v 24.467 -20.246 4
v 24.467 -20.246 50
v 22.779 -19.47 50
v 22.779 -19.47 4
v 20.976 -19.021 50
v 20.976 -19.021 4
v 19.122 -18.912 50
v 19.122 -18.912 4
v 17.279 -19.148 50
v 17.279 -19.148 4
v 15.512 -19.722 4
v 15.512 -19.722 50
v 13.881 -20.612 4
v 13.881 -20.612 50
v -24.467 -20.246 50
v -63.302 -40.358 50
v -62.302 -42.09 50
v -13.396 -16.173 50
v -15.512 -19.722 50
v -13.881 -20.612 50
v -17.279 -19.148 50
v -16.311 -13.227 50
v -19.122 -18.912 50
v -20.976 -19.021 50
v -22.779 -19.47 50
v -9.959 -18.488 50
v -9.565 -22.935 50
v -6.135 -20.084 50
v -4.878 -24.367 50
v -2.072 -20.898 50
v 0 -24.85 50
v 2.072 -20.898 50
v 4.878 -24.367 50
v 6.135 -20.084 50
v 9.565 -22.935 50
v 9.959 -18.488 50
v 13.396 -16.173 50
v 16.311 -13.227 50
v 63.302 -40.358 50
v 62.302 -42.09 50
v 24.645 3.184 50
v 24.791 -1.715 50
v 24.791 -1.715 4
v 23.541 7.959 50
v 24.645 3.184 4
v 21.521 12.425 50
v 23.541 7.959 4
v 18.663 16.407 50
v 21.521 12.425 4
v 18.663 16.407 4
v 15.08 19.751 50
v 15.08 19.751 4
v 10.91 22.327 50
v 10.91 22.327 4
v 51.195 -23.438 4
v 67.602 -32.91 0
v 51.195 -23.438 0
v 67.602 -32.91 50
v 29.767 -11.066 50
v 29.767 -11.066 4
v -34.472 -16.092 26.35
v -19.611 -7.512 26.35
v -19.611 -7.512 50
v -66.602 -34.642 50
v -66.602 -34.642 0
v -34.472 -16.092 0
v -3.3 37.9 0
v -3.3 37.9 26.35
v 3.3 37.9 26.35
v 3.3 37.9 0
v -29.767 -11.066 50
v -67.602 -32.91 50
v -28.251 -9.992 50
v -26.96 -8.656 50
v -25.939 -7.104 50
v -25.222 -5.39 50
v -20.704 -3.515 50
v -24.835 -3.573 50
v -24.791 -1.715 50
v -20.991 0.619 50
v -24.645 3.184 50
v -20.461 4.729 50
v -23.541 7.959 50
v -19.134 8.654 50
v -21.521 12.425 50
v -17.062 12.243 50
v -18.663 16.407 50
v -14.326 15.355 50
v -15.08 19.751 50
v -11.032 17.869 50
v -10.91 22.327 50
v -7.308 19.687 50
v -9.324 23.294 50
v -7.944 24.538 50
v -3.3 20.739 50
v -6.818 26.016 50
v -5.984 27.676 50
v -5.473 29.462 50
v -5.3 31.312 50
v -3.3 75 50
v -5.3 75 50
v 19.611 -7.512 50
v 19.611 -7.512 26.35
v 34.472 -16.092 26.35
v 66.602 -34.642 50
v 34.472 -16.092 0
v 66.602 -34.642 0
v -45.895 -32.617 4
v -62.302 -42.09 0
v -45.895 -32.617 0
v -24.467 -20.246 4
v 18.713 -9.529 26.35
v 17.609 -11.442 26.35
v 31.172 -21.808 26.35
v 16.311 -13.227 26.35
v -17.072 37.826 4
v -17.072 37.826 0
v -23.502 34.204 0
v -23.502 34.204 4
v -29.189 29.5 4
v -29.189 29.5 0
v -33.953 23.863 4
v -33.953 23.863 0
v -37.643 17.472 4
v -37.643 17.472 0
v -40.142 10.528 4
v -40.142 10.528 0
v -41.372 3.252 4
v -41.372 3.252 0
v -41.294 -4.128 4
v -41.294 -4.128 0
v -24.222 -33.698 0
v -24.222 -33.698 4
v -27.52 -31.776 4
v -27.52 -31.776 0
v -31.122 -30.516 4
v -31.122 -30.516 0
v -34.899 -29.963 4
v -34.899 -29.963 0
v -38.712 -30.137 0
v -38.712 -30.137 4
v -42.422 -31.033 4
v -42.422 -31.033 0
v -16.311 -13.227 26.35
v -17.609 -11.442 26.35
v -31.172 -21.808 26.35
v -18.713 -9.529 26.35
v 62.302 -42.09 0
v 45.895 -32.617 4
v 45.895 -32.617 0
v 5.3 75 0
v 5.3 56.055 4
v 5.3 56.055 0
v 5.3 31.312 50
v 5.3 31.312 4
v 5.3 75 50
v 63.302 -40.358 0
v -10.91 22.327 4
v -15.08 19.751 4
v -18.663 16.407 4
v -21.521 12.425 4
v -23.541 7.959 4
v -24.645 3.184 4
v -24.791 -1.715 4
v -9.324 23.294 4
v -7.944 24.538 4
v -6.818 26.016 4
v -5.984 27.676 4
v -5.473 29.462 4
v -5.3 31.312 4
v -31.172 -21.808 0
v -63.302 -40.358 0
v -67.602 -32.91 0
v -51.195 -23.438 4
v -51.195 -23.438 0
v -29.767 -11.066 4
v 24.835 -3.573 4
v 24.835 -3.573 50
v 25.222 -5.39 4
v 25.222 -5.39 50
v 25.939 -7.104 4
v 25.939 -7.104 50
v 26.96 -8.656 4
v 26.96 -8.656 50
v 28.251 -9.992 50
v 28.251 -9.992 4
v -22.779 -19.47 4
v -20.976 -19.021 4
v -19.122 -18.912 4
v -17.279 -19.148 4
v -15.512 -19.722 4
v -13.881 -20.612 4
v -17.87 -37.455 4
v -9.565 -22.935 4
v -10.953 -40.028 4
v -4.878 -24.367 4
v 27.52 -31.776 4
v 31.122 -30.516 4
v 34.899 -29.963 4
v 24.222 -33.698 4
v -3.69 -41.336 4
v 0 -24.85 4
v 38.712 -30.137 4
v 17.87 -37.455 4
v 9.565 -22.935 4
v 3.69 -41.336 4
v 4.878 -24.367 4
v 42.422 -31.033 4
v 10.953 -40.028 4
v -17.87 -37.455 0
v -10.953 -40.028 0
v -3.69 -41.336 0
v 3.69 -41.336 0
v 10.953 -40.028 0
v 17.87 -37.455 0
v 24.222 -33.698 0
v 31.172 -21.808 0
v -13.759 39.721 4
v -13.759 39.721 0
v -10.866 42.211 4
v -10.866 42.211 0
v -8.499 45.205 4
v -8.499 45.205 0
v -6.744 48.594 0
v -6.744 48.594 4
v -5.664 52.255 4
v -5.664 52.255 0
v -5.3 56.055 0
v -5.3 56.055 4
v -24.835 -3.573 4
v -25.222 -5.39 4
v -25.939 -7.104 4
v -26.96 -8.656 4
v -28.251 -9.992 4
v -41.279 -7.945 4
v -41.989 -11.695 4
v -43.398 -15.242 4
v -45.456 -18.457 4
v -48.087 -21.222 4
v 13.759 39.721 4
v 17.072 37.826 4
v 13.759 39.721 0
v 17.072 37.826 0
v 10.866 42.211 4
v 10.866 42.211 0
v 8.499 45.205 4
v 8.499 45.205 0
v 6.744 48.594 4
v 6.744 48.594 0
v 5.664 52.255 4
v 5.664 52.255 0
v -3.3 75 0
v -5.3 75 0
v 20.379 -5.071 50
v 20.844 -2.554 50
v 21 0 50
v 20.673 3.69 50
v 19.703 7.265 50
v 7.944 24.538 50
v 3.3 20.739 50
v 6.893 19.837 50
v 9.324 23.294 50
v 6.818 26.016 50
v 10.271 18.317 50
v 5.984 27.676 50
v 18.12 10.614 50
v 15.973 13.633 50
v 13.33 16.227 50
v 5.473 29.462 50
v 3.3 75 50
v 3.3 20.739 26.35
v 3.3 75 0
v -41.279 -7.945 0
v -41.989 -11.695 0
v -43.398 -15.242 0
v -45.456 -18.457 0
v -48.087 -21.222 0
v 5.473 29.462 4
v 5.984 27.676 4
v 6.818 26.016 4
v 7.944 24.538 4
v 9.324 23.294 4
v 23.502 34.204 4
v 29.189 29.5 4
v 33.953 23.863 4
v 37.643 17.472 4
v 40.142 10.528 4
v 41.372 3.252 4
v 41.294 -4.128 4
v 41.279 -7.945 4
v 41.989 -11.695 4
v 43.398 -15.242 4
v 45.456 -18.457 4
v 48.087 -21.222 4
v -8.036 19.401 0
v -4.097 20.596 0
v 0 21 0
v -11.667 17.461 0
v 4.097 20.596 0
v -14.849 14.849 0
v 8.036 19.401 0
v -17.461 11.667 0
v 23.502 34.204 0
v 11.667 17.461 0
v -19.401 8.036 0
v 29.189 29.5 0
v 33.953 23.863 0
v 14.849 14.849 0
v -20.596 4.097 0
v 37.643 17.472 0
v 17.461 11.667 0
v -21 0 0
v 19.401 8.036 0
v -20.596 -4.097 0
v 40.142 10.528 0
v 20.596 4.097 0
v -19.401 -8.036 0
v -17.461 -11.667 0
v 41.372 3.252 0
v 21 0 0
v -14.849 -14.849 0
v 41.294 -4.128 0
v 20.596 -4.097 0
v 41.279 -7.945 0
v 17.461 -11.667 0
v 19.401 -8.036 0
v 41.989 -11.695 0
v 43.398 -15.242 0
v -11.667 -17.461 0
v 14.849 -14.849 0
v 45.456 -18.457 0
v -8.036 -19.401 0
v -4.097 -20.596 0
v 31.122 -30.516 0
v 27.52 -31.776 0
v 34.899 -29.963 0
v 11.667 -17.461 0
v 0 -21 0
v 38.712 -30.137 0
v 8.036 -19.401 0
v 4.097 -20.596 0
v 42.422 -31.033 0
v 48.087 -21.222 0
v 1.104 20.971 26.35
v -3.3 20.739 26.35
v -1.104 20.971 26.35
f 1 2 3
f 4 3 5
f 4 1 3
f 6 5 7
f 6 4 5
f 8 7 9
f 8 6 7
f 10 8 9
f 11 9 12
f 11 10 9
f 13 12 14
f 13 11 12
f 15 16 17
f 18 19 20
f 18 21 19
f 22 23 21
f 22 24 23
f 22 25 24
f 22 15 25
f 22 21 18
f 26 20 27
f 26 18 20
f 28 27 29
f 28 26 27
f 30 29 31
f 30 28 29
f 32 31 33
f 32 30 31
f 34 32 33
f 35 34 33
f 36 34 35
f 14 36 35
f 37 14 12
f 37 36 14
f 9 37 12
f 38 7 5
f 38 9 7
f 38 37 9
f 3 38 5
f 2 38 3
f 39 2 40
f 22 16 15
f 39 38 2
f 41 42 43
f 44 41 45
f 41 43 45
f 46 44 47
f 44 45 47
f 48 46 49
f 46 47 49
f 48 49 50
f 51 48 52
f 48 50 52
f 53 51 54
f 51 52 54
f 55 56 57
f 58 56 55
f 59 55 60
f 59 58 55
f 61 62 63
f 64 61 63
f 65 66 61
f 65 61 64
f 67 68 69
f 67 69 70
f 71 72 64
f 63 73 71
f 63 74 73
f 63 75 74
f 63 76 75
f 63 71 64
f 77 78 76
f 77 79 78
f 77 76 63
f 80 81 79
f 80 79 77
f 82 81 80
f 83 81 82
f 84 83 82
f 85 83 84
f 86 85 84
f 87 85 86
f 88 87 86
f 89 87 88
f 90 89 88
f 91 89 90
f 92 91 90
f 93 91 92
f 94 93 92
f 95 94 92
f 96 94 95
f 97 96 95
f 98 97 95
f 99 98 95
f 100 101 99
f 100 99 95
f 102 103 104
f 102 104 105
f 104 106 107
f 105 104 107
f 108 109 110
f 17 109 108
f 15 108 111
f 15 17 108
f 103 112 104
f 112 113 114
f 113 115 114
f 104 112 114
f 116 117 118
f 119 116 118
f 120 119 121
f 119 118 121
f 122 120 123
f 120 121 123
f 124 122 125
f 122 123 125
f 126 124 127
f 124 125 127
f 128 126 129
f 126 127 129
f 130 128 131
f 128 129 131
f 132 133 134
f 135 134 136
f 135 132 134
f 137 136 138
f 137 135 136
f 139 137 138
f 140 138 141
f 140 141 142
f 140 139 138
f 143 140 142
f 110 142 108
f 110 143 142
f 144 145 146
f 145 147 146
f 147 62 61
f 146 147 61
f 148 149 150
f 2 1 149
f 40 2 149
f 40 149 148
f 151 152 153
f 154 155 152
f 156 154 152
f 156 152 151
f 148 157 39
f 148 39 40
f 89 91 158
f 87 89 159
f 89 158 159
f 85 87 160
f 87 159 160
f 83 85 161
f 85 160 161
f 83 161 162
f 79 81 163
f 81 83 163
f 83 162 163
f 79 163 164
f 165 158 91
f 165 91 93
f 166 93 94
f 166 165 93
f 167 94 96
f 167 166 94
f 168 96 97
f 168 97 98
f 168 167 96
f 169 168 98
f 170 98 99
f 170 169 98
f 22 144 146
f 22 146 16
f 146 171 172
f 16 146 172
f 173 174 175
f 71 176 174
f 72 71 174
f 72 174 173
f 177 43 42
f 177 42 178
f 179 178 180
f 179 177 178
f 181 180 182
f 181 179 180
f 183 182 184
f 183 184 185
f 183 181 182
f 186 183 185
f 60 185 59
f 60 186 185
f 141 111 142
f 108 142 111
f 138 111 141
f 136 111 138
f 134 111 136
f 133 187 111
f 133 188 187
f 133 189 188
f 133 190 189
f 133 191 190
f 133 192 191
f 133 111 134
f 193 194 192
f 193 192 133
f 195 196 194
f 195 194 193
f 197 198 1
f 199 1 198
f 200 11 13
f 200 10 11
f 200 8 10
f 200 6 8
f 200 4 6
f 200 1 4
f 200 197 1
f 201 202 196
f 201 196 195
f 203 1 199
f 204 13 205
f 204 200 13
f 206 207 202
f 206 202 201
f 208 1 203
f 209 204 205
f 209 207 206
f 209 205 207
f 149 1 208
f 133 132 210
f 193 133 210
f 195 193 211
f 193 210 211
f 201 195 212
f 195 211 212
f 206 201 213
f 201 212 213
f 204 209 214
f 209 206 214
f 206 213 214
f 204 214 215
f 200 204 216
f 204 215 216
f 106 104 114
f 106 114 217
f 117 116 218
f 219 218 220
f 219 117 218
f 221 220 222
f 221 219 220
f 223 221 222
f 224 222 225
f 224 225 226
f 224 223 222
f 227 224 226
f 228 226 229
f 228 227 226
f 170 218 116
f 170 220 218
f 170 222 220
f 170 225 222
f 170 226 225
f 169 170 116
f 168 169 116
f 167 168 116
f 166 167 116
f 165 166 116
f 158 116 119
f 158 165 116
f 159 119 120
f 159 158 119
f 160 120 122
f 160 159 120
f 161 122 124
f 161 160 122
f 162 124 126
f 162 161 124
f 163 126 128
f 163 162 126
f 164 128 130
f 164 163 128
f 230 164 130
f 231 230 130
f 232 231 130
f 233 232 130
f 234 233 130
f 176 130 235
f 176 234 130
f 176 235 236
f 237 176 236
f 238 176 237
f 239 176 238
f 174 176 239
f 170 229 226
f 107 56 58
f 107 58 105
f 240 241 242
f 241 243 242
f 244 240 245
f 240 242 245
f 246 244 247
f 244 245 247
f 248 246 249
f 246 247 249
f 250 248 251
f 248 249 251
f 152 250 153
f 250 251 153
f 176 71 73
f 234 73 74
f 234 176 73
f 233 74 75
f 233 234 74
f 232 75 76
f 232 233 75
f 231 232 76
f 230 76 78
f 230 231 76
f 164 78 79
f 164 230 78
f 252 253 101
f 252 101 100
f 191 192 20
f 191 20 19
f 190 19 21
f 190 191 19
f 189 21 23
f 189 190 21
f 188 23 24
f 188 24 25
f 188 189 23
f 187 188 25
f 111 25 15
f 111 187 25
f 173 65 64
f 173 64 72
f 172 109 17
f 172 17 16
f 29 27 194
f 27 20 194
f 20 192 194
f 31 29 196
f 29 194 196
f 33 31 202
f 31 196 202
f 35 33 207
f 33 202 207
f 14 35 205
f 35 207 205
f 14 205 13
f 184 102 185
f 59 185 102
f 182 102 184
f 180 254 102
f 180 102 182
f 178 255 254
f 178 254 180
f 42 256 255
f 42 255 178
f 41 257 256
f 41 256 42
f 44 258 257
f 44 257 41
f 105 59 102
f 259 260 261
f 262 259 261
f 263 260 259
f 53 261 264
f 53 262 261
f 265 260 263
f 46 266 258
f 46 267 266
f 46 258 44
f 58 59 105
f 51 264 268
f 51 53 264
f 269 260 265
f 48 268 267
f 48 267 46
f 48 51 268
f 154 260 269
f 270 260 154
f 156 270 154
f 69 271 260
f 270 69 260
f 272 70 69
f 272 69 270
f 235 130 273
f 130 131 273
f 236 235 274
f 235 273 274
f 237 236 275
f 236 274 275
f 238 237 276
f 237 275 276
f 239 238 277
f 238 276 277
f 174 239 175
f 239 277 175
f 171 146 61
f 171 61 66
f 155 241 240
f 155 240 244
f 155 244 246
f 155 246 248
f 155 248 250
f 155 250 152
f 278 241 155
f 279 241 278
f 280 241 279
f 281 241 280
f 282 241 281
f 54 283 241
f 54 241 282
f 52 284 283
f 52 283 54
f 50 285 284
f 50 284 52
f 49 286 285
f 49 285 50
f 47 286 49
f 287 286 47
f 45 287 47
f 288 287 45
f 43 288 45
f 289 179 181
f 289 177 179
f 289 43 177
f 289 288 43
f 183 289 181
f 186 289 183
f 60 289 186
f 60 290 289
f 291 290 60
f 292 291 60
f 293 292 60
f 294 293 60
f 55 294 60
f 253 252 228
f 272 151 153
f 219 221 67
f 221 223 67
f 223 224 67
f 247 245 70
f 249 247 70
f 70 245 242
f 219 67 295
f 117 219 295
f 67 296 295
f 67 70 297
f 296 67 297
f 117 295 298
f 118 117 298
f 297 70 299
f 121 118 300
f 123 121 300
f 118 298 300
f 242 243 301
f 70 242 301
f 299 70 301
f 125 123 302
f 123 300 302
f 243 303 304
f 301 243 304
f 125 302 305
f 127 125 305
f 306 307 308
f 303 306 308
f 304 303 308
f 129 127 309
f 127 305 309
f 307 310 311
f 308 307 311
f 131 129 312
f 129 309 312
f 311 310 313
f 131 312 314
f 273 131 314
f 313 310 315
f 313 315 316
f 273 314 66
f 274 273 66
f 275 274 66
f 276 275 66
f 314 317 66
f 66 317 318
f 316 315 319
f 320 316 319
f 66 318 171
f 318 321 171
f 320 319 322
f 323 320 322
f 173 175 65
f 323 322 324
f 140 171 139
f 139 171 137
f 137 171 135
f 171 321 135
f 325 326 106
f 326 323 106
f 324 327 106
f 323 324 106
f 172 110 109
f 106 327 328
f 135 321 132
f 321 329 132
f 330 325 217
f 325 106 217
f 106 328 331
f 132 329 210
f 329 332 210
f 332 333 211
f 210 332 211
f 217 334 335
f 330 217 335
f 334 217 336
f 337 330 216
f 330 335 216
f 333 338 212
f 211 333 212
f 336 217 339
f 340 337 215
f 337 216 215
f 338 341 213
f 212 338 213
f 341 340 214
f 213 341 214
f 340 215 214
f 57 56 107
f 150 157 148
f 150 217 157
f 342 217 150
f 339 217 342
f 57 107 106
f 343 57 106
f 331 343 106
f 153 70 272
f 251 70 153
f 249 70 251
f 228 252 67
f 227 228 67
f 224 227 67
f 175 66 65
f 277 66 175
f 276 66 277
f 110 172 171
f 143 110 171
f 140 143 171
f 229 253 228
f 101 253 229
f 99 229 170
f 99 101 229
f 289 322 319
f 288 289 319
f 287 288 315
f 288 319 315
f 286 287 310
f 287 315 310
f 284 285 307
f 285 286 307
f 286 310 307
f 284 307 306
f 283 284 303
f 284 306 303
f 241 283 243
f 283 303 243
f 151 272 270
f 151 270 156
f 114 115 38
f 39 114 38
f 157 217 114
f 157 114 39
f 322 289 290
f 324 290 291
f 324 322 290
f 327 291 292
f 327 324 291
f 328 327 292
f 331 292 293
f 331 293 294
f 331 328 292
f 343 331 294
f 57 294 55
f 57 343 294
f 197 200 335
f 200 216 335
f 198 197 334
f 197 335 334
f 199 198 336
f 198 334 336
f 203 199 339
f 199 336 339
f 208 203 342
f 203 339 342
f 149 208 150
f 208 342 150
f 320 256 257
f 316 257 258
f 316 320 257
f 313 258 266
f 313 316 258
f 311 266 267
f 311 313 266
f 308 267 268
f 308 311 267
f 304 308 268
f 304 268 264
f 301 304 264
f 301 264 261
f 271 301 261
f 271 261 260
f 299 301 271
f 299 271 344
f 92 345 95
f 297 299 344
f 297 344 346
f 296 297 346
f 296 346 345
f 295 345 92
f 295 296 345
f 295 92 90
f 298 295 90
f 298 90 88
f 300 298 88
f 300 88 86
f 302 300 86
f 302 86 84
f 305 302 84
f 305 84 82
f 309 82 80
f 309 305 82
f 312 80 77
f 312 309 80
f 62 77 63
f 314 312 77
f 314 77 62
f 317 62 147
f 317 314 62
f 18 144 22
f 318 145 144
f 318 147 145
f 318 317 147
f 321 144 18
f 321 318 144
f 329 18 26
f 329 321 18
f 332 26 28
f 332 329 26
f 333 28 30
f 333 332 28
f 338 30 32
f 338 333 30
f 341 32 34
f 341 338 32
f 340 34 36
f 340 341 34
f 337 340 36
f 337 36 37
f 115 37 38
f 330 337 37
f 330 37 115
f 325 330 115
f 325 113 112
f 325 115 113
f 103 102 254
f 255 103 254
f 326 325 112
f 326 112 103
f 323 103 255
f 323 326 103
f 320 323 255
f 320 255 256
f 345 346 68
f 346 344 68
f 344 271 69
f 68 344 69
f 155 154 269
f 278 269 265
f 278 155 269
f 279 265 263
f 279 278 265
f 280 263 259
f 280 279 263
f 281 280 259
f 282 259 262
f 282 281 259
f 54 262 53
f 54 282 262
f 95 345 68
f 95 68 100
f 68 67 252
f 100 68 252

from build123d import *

# Parameters (mm, degrees)
SKETCH1_R                       = 20.75
BOSS_EXTRUDE1_DEPTH             = 50
BOSS_EXTRUDE2_DEPTH             = 3.2
THICKEN1_OUTLINE_R              = 24.85
THICKEN1_OUTLINE_R_2            = 20.85
THICKEN1_DEPTH                  = 50
THICKEN2_OUTLINE_W              = 2
THICKEN2_OUTLINE_H              = 37
THICKEN2_DEPTH                  = 50
THICKEN2_START                  = 26.35
THICKEN2_2_DEPTH                = 23.65
THICKEN3_OUTLINE_W              = 2
THICKEN3_OUTLINE_H              = 37
THICKEN3_DEPTH                  = 50
THICKEN3_START                  = 26.35
THICKEN3_2_DEPTH                = 23.65
BOSS_EXTRUDE4_REACH             = 95.501
SKETCH4_W                       = 26.35
SKETCH4_H                       = 17.15
BOSS_EXTRUDE4_DIRECTION_2_REACH = 95.501
FILLET1_R                       = 10
SKETCH3_R                       = 41.5
BOSS_EXTRUDE3_DEPTH             = 4
FILLET2_R                       = 20
CIRPATTERN4_COUNT               = 3
MOVE_FACE3_BY                   = 0.25
MOVE_FACE4_BY                   = 0.1
MOVE_FACE4_2_BY                 = 0.1
MOVE_FACE4_3_BY                 = 0.1
MOVE_START                      = 26.35
MOVE_FACE5_OUTLINE_W            = 6.6
MOVE_FACE5_OUTLINE_H            = 20.75
MOVE_FACE5_DEPTH                = 23.65
CIRPATTERN1_COUNT               = 3


with BuildPart() as part:
    # Sketch1 → Boss-Extrude1 (new body)
    with BuildSketch(Plane.XY):
        Circle(SKETCH1_R)
    extrude(amount=BOSS_EXTRUDE1_DEPTH)

    # Move Face3: a curved face moved outward by 0.25
    add(Solid.thicken(part.faces().sort_by_distance((-20.75, 0, 25))[0], MOVE_FACE3_BY))


with BuildPart() as body_2:
    # Sketch2 → Boss-Extrude2 (new, symmetric)
    with BuildSketch(Plane(origin=(0, 0, 0), x_dir=(0, 0, -1), z_dir=(1, 0, 0))):
        Polygon((-26.35, 20.75), (-26.35, 38), (0, 38), (0, 75), (-50, 75), (-50, 20.75), align=None)
    extrude(amount=BOSS_EXTRUDE2_DEPTH, both=True)

    # Move Face4: a face moved outward by 0.1
    extrude(body_2.faces().sort_by_distance((0, 38, 13.175))[0], amount=MOVE_FACE4_BY, dir=(0, -1, 0))

    # Move Face4 2: a face moved outward by 0.1
    extrude(body_2.faces().sort_by_distance((-3.2, 51.599129054, 27.380423031))[0], amount=MOVE_FACE4_2_BY, dir=(-1, 0, 0))

    # Move Face4 3: a face moved outward by 0.1
    extrude(body_2.faces().sort_by_distance((3.2, 51.599129054, 27.380423031))[0], amount=MOVE_FACE4_3_BY, dir=(1, 0, 0))

    # Move Face5: read off the stored shape, not the designer's step
    # Move Face5 outline → Move Face5 (add)
    with BuildSketch(Plane.XY.offset(MOVE_START)):
        with Locations((0, 10.375)):
            Rectangle(MOVE_FACE5_OUTLINE_W, MOVE_FACE5_OUTLINE_H)
    extrude(amount=MOVE_FACE5_DEPTH)


with BuildPart() as body_3:
    # Thicken1: read off the stored shape, not the designer's step
    # Thicken1 outline → Thicken1 (new body)
    with BuildSketch(Plane.XY):
        Circle(THICKEN1_OUTLINE_R)
        Circle(THICKEN1_OUTLINE_R_2, mode=Mode.SUBTRACT)
    extrude(amount=THICKEN1_DEPTH)

    # Thicken2: read off the stored shape, not the designer's step
    # Thicken2 outline → Thicken2 (add)
    with BuildSketch(Plane.XY):
        with Locations((-4.3, 56.5)):
            Rectangle(THICKEN2_OUTLINE_W, THICKEN2_OUTLINE_H)
    extrude(amount=THICKEN2_DEPTH)

    # Thicken2 2 outline → Thicken2 2 (add)
    with BuildSketch(Plane.XY.offset(THICKEN2_START)):
        with BuildLine():
            Line((-5.3, 38), (-5.3, 24.27823099))
            ThreePointArc((-5.3, 24.27823099), (-4.303593806, 24.474508787), (-3.3, 24.629910678))
            Line((-3.3, 24.629910678), (-3.3, 38))
            Line((-3.3, 38), (-5.3, 38))
        make_face()
    extrude(amount=THICKEN2_2_DEPTH)

    # Thicken3: read off the stored shape, not the designer's step
    # Thicken3 outline → Thicken3 (add)
    with BuildSketch(Plane.XY):
        with Locations((4.3, 56.5)):
            Rectangle(THICKEN3_OUTLINE_W, THICKEN3_OUTLINE_H)
    extrude(amount=THICKEN3_DEPTH)

    # Thicken3 2 outline → Thicken3 2 (add)
    with BuildSketch(Plane.XY.offset(THICKEN3_START)):
        with BuildLine():
            Line((5.3, 38), (3.3, 38))
            Line((3.3, 38), (3.3, 24.629910678))
            ThreePointArc((3.3, 24.629910678), (4.303593806, 24.474508787), (5.3, 24.27823099))
            Line((5.3, 24.27823099), (5.3, 38))
        make_face()
    extrude(amount=THICKEN3_2_DEPTH)

    # Boss-Extrude4: up to this face of the body (flat: up to its plane)
    boss_extrude4_end = Plane(body_3.part.faces().sort_by_distance((5.3, 52.715205781, 26.966203656))[0])
    # Sketch4 → Boss-Extrude4 (add, up to the picked face)
    with BuildSketch(Plane(origin=(0, 0, 0), x_dir=(0, 0, -1), z_dir=(1, 0, 0)), mode=Mode.PRIVATE) as boss_extrude4_sk1:
        with Locations((-13.175, 29.425)):
            Rectangle(SKETCH4_W, SKETCH4_H)
    boss_extrude4_tool1 = split(extrude(boss_extrude4_sk1.sketch, amount=BOSS_EXTRUDE4_REACH, mode=Mode.PRIVATE), bisect_by=boss_extrude4_end, keep=Keep.BOTH, mode=Mode.PRIVATE)
    add(boss_extrude4_tool1.solids().sort_by(Axis((0, 29.425, 13.175), (1, 0, 0)))[0])

    # Boss-Extrude4 direction 2: up to this face of the body (flat: up to its plane)
    boss_extrude4_direction_2_end = Plane(body_3.part.faces().sort_by_distance((-5.3, 52.715205781, 26.966203656))[0])
    # Sketch4 → Boss-Extrude4 direction 2 (add, up to the picked face)
    with BuildSketch(Plane(origin=(0, 0, 0), x_dir=(0, 0, -1), z_dir=(1, 0, 0)), mode=Mode.PRIVATE) as boss_extrude4_direction_2_sk1:
        with Locations((-13.175, 29.425)):
            Rectangle(SKETCH4_W, SKETCH4_H)
    boss_extrude4_direction_2_tool1 = split(extrude(boss_extrude4_direction_2_sk1.sketch, amount=-BOSS_EXTRUDE4_DIRECTION_2_REACH, mode=Mode.PRIVATE), bisect_by=boss_extrude4_direction_2_end, keep=Keep.BOTH, mode=Mode.PRIVATE)
    add(boss_extrude4_direction_2_tool1.solids().sort_by(Axis((0, 29.425, 13.175), (-1, 0, 0)))[0])

    # Fillet1
    fillet1_edges = [body_3.edges().sort_by_distance(p)[0] for p in [
        (-5.3, 24.27823099, 13.175),
        (5.3, 24.27823099, 13.175),
    ]]
    fillet(fillet1_edges, radius=FILLET1_R)

    # Sketch3 → Boss-Extrude3 (add)
    with BuildSketch(Plane.XY):
        Circle(SKETCH3_R)
    extrude(amount=BOSS_EXTRUDE3_DEPTH)

    # Fillet2
    fillet2_edges = [body_3.edges().sort_by_distance(p)[0] for p in [
        (-5.3, 41.160174927, 2),
        (5.3, 41.160174927, 2),
    ]]
    fillet(fillet2_edges, radius=FILLET2_R)


with BuildPart() as cirpattern4_1:
    # CirPattern4: pattern copy
    add(body_3.part.rotate(Axis((0, 0, 0), (0, 0, 1)), 1 * 360 / CIRPATTERN4_COUNT))


with BuildPart() as cirpattern4_2:
    # CirPattern4: pattern copy
    add(body_3.part.rotate(Axis((0, 0, 0), (0, 0, 1)), 2 * 360 / CIRPATTERN4_COUNT))

    # Combine2: read off the stored shape, not the designer's step
    # Combine2: union CirPattern4_1, body 3
    add(cirpattern4_1.part)
    add(body_3.part)


with BuildPart() as cirpattern1_1:
    # CirPattern1: pattern copy
    add(body_2.part.rotate(Axis((0, 0, 0), (0, 0, 1)), 1 * 360 / CIRPATTERN1_COUNT))


with BuildPart() as cirpattern1_2:
    # CirPattern1: pattern copy
    add(body_2.part.rotate(Axis((0, 0, 0), (0, 0, 1)), 2 * 360 / CIRPATTERN1_COUNT))


with BuildPart() as cirpattern4_2_1:
    add(cirpattern4_2.part)

    # Combine3: read off the stored shape, not the designer's step
    # Combine3: cut CirPattern1_2, CirPattern1_1, body 2, part
    add(cirpattern1_2.part, mode=Mode.SUBTRACT)
    add(cirpattern1_1.part, mode=Mode.SUBTRACT)
    add(body_2.part, mode=Mode.SUBTRACT)
    add(part.part, mode=Mode.SUBTRACT)


solid = cirpattern4_2_1.part
